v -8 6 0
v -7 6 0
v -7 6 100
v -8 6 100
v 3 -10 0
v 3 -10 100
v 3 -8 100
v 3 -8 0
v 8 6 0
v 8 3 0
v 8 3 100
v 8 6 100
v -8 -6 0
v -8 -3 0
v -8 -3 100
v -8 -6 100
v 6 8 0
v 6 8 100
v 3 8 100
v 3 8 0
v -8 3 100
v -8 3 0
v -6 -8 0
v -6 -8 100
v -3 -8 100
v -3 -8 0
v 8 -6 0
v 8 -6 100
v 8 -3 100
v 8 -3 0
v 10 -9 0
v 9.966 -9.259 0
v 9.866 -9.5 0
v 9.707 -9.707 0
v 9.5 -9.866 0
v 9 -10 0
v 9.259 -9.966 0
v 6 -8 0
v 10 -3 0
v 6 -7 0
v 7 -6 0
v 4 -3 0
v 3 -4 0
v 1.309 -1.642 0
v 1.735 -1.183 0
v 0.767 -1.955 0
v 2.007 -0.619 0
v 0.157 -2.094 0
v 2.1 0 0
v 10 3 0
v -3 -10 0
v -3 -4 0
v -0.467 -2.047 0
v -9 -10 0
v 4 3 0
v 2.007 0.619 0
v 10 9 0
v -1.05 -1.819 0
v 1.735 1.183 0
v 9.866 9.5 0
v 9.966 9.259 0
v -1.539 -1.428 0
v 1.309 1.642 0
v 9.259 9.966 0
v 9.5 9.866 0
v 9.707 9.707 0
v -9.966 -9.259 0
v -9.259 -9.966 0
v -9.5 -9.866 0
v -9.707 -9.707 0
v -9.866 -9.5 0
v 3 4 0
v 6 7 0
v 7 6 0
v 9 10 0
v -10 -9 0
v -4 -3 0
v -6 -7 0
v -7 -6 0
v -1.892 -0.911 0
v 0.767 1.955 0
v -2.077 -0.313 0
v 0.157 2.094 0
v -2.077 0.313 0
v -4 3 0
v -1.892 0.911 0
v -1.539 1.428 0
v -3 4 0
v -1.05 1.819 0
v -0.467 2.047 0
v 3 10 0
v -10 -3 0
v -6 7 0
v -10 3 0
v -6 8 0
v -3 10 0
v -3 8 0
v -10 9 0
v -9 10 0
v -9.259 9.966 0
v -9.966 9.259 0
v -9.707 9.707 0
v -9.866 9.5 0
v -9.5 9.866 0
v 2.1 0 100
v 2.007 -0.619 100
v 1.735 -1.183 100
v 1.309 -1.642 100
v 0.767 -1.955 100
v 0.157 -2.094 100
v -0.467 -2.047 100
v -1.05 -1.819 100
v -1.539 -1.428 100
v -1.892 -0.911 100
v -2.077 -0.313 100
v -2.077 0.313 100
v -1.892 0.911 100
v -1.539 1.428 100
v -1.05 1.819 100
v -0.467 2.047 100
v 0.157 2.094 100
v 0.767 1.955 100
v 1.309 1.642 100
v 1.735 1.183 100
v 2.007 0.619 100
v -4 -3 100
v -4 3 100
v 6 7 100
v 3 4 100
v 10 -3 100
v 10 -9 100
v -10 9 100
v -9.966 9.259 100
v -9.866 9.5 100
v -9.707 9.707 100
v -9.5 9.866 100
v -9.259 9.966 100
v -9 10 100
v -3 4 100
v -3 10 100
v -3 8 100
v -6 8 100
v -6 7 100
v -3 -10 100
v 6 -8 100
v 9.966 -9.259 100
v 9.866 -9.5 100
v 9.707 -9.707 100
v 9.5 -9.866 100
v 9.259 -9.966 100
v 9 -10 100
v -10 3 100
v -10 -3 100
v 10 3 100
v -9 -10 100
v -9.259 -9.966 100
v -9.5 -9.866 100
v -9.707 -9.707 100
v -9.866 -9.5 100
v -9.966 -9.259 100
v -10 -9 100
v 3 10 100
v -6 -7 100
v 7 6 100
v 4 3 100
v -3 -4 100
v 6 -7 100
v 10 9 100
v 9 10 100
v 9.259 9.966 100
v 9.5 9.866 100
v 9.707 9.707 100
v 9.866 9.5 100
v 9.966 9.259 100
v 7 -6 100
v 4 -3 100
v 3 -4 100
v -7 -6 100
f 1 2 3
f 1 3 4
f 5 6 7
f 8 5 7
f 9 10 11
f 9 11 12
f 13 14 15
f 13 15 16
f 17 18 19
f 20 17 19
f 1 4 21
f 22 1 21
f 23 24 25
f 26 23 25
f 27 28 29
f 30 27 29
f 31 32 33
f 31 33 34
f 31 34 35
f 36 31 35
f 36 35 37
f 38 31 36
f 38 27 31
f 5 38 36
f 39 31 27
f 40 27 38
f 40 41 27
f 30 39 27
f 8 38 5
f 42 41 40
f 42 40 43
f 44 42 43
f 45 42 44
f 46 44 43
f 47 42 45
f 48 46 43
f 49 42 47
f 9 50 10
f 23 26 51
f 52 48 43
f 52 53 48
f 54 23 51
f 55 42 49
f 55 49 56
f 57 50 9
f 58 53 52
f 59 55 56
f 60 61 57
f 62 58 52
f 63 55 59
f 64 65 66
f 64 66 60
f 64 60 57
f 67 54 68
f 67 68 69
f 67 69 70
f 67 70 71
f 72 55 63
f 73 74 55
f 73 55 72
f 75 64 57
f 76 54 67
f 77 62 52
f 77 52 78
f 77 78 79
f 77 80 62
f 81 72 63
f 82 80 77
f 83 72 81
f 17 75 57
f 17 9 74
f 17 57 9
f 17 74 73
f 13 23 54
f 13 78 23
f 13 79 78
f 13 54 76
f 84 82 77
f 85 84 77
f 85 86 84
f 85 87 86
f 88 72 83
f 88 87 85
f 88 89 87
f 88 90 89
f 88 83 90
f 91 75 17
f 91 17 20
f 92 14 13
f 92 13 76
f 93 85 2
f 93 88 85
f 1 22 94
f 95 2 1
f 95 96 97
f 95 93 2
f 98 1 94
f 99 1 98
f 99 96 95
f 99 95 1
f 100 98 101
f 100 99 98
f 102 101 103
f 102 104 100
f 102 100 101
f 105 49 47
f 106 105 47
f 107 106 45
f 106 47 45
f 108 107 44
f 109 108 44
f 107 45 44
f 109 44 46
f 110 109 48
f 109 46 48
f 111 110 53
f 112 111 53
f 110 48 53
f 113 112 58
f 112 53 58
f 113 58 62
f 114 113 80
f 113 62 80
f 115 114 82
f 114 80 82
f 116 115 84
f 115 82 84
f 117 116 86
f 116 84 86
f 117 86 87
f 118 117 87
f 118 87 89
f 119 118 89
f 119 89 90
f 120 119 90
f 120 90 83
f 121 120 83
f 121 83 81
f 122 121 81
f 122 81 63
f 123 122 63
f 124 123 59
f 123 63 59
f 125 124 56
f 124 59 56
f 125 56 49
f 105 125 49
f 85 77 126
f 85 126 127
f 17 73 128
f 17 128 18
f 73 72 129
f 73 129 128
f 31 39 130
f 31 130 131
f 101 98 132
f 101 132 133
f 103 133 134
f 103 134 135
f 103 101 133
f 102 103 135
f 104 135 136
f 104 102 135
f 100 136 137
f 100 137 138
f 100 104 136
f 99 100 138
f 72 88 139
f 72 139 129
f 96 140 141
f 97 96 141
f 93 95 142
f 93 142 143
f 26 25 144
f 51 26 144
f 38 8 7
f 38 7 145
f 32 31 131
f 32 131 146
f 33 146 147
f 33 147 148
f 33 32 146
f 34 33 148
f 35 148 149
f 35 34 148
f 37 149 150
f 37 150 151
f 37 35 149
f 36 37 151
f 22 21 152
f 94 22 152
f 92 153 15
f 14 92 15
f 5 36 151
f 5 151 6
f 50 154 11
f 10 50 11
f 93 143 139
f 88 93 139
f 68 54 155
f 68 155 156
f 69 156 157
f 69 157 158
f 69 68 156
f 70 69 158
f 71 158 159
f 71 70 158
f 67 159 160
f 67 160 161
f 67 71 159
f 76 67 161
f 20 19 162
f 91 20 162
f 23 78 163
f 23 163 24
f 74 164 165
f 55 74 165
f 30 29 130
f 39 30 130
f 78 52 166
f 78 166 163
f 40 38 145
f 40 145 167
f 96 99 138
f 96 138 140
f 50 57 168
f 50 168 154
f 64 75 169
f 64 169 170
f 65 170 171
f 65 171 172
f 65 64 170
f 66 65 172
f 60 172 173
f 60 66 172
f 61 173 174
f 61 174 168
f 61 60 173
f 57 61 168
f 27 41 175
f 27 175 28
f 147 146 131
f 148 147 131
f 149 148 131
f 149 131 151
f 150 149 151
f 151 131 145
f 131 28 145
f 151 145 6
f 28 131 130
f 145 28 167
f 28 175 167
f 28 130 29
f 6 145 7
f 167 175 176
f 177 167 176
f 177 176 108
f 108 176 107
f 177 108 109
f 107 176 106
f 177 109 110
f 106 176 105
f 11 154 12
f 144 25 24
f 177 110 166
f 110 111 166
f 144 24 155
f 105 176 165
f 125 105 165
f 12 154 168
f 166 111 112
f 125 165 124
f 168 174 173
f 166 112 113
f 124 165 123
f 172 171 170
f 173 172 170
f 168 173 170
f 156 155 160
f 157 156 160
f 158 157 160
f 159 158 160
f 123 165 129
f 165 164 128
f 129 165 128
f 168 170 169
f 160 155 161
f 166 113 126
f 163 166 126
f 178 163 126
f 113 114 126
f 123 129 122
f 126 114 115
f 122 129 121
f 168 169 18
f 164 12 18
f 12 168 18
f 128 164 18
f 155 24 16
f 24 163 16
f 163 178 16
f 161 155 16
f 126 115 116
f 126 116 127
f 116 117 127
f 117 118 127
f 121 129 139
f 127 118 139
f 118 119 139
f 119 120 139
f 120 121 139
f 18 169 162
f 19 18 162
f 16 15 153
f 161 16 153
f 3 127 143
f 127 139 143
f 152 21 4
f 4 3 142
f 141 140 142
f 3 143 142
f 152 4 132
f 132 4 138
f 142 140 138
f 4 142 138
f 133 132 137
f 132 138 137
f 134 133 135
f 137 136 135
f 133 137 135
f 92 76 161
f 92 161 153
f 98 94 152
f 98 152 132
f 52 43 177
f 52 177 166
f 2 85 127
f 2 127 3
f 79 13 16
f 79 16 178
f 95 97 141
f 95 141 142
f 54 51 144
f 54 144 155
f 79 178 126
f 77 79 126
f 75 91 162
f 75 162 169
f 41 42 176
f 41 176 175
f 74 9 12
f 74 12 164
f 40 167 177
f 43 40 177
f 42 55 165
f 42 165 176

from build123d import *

# Parameters (mm, degrees)
SKETCH1_R           = 2.1
BOSS_EXTRUDE1_DEPTH = 100


with BuildPart() as part:
    # Sketch1 → Boss-Extrude1 (new body)
    with BuildSketch(Plane(origin=(0, 0, 0), x_dir=(-1, 0, 0), z_dir=(0, 0, -1))):
        with BuildLine():
            Line((6, -8), (3, -8))
            Line((3, -8), (3, -10))
            Line((3, -10), (9, -10))
            ThreePointArc((9, -10), (9.707106781, -9.707106781), (10, -9))
            Line((10, -9), (10, -3))
            Line((10, -3), (8, -3))
            Line((8, -3), (8, -6))
            Line((8, -6), (7, -6))
            Line((7, -6), (4, -3))
            Line((4, -3), (4, 3))
            Line((4, 3), (7, 6))
            Line((7, 6), (8, 6))
            Line((8, 6), (8, 3))
            Line((8, 3), (10, 3))
            Line((10, 3), (10, 9))
            ThreePointArc((10, 9), (9.707106781, 9.707106781), (9, 10))
            Line((9, 10), (3, 10))
            Line((3, 10), (3, 8))
            Line((3, 8), (6, 8))
            Line((6, 8), (6, 7))
            Line((6, 7), (3, 4))
            Line((3, 4), (-3, 4))
            Line((-3, 4), (-6, 7))
            Line((-6, 7), (-6, 8))
            Line((-6, 8), (-3, 8))
            Line((-3, 8), (-3, 10))
            Line((-3, 10), (-9, 10))
            ThreePointArc((-9, 10), (-9.707106781, 9.707106781), (-10, 9))
            Line((-10, 9), (-10, 3))
            Line((-10, 3), (-8, 3))
            Line((-8, 3), (-8, 6))
            Line((-8, 6), (-7, 6))
            Line((-7, 6), (-4, 3))
            Line((-4, 3), (-4, -3))
            Line((-4, -3), (-7, -6))
            Line((-7, -6), (-8, -6))
            Line((-8, -6), (-8, -3))
            Line((-8, -3), (-10, -3))
            Line((-10, -3), (-10, -9))
            ThreePointArc((-10, -9), (-9.707106781, -9.707106781), (-9, -10))
            Line((-9, -10), (-3, -10))
            Line((-3, -10), (-3, -8))
            Line((-3, -8), (-6, -8))
            Line((-6, -8), (-6, -7))
            Line((-6, -7), (-3, -4))
            Line((-3, -4), (3, -4))
            Line((3, -4), (6, -7))
            Line((6, -7), (6, -8))
        make_face()
        with Locations(Location((0, 0, 0), (0, 0, 180))):
            Circle(SKETCH1_R, mode=Mode.SUBTRACT)
    extrude(amount=-BOSS_EXTRUDE1_DEPTH)


solid = part.part
